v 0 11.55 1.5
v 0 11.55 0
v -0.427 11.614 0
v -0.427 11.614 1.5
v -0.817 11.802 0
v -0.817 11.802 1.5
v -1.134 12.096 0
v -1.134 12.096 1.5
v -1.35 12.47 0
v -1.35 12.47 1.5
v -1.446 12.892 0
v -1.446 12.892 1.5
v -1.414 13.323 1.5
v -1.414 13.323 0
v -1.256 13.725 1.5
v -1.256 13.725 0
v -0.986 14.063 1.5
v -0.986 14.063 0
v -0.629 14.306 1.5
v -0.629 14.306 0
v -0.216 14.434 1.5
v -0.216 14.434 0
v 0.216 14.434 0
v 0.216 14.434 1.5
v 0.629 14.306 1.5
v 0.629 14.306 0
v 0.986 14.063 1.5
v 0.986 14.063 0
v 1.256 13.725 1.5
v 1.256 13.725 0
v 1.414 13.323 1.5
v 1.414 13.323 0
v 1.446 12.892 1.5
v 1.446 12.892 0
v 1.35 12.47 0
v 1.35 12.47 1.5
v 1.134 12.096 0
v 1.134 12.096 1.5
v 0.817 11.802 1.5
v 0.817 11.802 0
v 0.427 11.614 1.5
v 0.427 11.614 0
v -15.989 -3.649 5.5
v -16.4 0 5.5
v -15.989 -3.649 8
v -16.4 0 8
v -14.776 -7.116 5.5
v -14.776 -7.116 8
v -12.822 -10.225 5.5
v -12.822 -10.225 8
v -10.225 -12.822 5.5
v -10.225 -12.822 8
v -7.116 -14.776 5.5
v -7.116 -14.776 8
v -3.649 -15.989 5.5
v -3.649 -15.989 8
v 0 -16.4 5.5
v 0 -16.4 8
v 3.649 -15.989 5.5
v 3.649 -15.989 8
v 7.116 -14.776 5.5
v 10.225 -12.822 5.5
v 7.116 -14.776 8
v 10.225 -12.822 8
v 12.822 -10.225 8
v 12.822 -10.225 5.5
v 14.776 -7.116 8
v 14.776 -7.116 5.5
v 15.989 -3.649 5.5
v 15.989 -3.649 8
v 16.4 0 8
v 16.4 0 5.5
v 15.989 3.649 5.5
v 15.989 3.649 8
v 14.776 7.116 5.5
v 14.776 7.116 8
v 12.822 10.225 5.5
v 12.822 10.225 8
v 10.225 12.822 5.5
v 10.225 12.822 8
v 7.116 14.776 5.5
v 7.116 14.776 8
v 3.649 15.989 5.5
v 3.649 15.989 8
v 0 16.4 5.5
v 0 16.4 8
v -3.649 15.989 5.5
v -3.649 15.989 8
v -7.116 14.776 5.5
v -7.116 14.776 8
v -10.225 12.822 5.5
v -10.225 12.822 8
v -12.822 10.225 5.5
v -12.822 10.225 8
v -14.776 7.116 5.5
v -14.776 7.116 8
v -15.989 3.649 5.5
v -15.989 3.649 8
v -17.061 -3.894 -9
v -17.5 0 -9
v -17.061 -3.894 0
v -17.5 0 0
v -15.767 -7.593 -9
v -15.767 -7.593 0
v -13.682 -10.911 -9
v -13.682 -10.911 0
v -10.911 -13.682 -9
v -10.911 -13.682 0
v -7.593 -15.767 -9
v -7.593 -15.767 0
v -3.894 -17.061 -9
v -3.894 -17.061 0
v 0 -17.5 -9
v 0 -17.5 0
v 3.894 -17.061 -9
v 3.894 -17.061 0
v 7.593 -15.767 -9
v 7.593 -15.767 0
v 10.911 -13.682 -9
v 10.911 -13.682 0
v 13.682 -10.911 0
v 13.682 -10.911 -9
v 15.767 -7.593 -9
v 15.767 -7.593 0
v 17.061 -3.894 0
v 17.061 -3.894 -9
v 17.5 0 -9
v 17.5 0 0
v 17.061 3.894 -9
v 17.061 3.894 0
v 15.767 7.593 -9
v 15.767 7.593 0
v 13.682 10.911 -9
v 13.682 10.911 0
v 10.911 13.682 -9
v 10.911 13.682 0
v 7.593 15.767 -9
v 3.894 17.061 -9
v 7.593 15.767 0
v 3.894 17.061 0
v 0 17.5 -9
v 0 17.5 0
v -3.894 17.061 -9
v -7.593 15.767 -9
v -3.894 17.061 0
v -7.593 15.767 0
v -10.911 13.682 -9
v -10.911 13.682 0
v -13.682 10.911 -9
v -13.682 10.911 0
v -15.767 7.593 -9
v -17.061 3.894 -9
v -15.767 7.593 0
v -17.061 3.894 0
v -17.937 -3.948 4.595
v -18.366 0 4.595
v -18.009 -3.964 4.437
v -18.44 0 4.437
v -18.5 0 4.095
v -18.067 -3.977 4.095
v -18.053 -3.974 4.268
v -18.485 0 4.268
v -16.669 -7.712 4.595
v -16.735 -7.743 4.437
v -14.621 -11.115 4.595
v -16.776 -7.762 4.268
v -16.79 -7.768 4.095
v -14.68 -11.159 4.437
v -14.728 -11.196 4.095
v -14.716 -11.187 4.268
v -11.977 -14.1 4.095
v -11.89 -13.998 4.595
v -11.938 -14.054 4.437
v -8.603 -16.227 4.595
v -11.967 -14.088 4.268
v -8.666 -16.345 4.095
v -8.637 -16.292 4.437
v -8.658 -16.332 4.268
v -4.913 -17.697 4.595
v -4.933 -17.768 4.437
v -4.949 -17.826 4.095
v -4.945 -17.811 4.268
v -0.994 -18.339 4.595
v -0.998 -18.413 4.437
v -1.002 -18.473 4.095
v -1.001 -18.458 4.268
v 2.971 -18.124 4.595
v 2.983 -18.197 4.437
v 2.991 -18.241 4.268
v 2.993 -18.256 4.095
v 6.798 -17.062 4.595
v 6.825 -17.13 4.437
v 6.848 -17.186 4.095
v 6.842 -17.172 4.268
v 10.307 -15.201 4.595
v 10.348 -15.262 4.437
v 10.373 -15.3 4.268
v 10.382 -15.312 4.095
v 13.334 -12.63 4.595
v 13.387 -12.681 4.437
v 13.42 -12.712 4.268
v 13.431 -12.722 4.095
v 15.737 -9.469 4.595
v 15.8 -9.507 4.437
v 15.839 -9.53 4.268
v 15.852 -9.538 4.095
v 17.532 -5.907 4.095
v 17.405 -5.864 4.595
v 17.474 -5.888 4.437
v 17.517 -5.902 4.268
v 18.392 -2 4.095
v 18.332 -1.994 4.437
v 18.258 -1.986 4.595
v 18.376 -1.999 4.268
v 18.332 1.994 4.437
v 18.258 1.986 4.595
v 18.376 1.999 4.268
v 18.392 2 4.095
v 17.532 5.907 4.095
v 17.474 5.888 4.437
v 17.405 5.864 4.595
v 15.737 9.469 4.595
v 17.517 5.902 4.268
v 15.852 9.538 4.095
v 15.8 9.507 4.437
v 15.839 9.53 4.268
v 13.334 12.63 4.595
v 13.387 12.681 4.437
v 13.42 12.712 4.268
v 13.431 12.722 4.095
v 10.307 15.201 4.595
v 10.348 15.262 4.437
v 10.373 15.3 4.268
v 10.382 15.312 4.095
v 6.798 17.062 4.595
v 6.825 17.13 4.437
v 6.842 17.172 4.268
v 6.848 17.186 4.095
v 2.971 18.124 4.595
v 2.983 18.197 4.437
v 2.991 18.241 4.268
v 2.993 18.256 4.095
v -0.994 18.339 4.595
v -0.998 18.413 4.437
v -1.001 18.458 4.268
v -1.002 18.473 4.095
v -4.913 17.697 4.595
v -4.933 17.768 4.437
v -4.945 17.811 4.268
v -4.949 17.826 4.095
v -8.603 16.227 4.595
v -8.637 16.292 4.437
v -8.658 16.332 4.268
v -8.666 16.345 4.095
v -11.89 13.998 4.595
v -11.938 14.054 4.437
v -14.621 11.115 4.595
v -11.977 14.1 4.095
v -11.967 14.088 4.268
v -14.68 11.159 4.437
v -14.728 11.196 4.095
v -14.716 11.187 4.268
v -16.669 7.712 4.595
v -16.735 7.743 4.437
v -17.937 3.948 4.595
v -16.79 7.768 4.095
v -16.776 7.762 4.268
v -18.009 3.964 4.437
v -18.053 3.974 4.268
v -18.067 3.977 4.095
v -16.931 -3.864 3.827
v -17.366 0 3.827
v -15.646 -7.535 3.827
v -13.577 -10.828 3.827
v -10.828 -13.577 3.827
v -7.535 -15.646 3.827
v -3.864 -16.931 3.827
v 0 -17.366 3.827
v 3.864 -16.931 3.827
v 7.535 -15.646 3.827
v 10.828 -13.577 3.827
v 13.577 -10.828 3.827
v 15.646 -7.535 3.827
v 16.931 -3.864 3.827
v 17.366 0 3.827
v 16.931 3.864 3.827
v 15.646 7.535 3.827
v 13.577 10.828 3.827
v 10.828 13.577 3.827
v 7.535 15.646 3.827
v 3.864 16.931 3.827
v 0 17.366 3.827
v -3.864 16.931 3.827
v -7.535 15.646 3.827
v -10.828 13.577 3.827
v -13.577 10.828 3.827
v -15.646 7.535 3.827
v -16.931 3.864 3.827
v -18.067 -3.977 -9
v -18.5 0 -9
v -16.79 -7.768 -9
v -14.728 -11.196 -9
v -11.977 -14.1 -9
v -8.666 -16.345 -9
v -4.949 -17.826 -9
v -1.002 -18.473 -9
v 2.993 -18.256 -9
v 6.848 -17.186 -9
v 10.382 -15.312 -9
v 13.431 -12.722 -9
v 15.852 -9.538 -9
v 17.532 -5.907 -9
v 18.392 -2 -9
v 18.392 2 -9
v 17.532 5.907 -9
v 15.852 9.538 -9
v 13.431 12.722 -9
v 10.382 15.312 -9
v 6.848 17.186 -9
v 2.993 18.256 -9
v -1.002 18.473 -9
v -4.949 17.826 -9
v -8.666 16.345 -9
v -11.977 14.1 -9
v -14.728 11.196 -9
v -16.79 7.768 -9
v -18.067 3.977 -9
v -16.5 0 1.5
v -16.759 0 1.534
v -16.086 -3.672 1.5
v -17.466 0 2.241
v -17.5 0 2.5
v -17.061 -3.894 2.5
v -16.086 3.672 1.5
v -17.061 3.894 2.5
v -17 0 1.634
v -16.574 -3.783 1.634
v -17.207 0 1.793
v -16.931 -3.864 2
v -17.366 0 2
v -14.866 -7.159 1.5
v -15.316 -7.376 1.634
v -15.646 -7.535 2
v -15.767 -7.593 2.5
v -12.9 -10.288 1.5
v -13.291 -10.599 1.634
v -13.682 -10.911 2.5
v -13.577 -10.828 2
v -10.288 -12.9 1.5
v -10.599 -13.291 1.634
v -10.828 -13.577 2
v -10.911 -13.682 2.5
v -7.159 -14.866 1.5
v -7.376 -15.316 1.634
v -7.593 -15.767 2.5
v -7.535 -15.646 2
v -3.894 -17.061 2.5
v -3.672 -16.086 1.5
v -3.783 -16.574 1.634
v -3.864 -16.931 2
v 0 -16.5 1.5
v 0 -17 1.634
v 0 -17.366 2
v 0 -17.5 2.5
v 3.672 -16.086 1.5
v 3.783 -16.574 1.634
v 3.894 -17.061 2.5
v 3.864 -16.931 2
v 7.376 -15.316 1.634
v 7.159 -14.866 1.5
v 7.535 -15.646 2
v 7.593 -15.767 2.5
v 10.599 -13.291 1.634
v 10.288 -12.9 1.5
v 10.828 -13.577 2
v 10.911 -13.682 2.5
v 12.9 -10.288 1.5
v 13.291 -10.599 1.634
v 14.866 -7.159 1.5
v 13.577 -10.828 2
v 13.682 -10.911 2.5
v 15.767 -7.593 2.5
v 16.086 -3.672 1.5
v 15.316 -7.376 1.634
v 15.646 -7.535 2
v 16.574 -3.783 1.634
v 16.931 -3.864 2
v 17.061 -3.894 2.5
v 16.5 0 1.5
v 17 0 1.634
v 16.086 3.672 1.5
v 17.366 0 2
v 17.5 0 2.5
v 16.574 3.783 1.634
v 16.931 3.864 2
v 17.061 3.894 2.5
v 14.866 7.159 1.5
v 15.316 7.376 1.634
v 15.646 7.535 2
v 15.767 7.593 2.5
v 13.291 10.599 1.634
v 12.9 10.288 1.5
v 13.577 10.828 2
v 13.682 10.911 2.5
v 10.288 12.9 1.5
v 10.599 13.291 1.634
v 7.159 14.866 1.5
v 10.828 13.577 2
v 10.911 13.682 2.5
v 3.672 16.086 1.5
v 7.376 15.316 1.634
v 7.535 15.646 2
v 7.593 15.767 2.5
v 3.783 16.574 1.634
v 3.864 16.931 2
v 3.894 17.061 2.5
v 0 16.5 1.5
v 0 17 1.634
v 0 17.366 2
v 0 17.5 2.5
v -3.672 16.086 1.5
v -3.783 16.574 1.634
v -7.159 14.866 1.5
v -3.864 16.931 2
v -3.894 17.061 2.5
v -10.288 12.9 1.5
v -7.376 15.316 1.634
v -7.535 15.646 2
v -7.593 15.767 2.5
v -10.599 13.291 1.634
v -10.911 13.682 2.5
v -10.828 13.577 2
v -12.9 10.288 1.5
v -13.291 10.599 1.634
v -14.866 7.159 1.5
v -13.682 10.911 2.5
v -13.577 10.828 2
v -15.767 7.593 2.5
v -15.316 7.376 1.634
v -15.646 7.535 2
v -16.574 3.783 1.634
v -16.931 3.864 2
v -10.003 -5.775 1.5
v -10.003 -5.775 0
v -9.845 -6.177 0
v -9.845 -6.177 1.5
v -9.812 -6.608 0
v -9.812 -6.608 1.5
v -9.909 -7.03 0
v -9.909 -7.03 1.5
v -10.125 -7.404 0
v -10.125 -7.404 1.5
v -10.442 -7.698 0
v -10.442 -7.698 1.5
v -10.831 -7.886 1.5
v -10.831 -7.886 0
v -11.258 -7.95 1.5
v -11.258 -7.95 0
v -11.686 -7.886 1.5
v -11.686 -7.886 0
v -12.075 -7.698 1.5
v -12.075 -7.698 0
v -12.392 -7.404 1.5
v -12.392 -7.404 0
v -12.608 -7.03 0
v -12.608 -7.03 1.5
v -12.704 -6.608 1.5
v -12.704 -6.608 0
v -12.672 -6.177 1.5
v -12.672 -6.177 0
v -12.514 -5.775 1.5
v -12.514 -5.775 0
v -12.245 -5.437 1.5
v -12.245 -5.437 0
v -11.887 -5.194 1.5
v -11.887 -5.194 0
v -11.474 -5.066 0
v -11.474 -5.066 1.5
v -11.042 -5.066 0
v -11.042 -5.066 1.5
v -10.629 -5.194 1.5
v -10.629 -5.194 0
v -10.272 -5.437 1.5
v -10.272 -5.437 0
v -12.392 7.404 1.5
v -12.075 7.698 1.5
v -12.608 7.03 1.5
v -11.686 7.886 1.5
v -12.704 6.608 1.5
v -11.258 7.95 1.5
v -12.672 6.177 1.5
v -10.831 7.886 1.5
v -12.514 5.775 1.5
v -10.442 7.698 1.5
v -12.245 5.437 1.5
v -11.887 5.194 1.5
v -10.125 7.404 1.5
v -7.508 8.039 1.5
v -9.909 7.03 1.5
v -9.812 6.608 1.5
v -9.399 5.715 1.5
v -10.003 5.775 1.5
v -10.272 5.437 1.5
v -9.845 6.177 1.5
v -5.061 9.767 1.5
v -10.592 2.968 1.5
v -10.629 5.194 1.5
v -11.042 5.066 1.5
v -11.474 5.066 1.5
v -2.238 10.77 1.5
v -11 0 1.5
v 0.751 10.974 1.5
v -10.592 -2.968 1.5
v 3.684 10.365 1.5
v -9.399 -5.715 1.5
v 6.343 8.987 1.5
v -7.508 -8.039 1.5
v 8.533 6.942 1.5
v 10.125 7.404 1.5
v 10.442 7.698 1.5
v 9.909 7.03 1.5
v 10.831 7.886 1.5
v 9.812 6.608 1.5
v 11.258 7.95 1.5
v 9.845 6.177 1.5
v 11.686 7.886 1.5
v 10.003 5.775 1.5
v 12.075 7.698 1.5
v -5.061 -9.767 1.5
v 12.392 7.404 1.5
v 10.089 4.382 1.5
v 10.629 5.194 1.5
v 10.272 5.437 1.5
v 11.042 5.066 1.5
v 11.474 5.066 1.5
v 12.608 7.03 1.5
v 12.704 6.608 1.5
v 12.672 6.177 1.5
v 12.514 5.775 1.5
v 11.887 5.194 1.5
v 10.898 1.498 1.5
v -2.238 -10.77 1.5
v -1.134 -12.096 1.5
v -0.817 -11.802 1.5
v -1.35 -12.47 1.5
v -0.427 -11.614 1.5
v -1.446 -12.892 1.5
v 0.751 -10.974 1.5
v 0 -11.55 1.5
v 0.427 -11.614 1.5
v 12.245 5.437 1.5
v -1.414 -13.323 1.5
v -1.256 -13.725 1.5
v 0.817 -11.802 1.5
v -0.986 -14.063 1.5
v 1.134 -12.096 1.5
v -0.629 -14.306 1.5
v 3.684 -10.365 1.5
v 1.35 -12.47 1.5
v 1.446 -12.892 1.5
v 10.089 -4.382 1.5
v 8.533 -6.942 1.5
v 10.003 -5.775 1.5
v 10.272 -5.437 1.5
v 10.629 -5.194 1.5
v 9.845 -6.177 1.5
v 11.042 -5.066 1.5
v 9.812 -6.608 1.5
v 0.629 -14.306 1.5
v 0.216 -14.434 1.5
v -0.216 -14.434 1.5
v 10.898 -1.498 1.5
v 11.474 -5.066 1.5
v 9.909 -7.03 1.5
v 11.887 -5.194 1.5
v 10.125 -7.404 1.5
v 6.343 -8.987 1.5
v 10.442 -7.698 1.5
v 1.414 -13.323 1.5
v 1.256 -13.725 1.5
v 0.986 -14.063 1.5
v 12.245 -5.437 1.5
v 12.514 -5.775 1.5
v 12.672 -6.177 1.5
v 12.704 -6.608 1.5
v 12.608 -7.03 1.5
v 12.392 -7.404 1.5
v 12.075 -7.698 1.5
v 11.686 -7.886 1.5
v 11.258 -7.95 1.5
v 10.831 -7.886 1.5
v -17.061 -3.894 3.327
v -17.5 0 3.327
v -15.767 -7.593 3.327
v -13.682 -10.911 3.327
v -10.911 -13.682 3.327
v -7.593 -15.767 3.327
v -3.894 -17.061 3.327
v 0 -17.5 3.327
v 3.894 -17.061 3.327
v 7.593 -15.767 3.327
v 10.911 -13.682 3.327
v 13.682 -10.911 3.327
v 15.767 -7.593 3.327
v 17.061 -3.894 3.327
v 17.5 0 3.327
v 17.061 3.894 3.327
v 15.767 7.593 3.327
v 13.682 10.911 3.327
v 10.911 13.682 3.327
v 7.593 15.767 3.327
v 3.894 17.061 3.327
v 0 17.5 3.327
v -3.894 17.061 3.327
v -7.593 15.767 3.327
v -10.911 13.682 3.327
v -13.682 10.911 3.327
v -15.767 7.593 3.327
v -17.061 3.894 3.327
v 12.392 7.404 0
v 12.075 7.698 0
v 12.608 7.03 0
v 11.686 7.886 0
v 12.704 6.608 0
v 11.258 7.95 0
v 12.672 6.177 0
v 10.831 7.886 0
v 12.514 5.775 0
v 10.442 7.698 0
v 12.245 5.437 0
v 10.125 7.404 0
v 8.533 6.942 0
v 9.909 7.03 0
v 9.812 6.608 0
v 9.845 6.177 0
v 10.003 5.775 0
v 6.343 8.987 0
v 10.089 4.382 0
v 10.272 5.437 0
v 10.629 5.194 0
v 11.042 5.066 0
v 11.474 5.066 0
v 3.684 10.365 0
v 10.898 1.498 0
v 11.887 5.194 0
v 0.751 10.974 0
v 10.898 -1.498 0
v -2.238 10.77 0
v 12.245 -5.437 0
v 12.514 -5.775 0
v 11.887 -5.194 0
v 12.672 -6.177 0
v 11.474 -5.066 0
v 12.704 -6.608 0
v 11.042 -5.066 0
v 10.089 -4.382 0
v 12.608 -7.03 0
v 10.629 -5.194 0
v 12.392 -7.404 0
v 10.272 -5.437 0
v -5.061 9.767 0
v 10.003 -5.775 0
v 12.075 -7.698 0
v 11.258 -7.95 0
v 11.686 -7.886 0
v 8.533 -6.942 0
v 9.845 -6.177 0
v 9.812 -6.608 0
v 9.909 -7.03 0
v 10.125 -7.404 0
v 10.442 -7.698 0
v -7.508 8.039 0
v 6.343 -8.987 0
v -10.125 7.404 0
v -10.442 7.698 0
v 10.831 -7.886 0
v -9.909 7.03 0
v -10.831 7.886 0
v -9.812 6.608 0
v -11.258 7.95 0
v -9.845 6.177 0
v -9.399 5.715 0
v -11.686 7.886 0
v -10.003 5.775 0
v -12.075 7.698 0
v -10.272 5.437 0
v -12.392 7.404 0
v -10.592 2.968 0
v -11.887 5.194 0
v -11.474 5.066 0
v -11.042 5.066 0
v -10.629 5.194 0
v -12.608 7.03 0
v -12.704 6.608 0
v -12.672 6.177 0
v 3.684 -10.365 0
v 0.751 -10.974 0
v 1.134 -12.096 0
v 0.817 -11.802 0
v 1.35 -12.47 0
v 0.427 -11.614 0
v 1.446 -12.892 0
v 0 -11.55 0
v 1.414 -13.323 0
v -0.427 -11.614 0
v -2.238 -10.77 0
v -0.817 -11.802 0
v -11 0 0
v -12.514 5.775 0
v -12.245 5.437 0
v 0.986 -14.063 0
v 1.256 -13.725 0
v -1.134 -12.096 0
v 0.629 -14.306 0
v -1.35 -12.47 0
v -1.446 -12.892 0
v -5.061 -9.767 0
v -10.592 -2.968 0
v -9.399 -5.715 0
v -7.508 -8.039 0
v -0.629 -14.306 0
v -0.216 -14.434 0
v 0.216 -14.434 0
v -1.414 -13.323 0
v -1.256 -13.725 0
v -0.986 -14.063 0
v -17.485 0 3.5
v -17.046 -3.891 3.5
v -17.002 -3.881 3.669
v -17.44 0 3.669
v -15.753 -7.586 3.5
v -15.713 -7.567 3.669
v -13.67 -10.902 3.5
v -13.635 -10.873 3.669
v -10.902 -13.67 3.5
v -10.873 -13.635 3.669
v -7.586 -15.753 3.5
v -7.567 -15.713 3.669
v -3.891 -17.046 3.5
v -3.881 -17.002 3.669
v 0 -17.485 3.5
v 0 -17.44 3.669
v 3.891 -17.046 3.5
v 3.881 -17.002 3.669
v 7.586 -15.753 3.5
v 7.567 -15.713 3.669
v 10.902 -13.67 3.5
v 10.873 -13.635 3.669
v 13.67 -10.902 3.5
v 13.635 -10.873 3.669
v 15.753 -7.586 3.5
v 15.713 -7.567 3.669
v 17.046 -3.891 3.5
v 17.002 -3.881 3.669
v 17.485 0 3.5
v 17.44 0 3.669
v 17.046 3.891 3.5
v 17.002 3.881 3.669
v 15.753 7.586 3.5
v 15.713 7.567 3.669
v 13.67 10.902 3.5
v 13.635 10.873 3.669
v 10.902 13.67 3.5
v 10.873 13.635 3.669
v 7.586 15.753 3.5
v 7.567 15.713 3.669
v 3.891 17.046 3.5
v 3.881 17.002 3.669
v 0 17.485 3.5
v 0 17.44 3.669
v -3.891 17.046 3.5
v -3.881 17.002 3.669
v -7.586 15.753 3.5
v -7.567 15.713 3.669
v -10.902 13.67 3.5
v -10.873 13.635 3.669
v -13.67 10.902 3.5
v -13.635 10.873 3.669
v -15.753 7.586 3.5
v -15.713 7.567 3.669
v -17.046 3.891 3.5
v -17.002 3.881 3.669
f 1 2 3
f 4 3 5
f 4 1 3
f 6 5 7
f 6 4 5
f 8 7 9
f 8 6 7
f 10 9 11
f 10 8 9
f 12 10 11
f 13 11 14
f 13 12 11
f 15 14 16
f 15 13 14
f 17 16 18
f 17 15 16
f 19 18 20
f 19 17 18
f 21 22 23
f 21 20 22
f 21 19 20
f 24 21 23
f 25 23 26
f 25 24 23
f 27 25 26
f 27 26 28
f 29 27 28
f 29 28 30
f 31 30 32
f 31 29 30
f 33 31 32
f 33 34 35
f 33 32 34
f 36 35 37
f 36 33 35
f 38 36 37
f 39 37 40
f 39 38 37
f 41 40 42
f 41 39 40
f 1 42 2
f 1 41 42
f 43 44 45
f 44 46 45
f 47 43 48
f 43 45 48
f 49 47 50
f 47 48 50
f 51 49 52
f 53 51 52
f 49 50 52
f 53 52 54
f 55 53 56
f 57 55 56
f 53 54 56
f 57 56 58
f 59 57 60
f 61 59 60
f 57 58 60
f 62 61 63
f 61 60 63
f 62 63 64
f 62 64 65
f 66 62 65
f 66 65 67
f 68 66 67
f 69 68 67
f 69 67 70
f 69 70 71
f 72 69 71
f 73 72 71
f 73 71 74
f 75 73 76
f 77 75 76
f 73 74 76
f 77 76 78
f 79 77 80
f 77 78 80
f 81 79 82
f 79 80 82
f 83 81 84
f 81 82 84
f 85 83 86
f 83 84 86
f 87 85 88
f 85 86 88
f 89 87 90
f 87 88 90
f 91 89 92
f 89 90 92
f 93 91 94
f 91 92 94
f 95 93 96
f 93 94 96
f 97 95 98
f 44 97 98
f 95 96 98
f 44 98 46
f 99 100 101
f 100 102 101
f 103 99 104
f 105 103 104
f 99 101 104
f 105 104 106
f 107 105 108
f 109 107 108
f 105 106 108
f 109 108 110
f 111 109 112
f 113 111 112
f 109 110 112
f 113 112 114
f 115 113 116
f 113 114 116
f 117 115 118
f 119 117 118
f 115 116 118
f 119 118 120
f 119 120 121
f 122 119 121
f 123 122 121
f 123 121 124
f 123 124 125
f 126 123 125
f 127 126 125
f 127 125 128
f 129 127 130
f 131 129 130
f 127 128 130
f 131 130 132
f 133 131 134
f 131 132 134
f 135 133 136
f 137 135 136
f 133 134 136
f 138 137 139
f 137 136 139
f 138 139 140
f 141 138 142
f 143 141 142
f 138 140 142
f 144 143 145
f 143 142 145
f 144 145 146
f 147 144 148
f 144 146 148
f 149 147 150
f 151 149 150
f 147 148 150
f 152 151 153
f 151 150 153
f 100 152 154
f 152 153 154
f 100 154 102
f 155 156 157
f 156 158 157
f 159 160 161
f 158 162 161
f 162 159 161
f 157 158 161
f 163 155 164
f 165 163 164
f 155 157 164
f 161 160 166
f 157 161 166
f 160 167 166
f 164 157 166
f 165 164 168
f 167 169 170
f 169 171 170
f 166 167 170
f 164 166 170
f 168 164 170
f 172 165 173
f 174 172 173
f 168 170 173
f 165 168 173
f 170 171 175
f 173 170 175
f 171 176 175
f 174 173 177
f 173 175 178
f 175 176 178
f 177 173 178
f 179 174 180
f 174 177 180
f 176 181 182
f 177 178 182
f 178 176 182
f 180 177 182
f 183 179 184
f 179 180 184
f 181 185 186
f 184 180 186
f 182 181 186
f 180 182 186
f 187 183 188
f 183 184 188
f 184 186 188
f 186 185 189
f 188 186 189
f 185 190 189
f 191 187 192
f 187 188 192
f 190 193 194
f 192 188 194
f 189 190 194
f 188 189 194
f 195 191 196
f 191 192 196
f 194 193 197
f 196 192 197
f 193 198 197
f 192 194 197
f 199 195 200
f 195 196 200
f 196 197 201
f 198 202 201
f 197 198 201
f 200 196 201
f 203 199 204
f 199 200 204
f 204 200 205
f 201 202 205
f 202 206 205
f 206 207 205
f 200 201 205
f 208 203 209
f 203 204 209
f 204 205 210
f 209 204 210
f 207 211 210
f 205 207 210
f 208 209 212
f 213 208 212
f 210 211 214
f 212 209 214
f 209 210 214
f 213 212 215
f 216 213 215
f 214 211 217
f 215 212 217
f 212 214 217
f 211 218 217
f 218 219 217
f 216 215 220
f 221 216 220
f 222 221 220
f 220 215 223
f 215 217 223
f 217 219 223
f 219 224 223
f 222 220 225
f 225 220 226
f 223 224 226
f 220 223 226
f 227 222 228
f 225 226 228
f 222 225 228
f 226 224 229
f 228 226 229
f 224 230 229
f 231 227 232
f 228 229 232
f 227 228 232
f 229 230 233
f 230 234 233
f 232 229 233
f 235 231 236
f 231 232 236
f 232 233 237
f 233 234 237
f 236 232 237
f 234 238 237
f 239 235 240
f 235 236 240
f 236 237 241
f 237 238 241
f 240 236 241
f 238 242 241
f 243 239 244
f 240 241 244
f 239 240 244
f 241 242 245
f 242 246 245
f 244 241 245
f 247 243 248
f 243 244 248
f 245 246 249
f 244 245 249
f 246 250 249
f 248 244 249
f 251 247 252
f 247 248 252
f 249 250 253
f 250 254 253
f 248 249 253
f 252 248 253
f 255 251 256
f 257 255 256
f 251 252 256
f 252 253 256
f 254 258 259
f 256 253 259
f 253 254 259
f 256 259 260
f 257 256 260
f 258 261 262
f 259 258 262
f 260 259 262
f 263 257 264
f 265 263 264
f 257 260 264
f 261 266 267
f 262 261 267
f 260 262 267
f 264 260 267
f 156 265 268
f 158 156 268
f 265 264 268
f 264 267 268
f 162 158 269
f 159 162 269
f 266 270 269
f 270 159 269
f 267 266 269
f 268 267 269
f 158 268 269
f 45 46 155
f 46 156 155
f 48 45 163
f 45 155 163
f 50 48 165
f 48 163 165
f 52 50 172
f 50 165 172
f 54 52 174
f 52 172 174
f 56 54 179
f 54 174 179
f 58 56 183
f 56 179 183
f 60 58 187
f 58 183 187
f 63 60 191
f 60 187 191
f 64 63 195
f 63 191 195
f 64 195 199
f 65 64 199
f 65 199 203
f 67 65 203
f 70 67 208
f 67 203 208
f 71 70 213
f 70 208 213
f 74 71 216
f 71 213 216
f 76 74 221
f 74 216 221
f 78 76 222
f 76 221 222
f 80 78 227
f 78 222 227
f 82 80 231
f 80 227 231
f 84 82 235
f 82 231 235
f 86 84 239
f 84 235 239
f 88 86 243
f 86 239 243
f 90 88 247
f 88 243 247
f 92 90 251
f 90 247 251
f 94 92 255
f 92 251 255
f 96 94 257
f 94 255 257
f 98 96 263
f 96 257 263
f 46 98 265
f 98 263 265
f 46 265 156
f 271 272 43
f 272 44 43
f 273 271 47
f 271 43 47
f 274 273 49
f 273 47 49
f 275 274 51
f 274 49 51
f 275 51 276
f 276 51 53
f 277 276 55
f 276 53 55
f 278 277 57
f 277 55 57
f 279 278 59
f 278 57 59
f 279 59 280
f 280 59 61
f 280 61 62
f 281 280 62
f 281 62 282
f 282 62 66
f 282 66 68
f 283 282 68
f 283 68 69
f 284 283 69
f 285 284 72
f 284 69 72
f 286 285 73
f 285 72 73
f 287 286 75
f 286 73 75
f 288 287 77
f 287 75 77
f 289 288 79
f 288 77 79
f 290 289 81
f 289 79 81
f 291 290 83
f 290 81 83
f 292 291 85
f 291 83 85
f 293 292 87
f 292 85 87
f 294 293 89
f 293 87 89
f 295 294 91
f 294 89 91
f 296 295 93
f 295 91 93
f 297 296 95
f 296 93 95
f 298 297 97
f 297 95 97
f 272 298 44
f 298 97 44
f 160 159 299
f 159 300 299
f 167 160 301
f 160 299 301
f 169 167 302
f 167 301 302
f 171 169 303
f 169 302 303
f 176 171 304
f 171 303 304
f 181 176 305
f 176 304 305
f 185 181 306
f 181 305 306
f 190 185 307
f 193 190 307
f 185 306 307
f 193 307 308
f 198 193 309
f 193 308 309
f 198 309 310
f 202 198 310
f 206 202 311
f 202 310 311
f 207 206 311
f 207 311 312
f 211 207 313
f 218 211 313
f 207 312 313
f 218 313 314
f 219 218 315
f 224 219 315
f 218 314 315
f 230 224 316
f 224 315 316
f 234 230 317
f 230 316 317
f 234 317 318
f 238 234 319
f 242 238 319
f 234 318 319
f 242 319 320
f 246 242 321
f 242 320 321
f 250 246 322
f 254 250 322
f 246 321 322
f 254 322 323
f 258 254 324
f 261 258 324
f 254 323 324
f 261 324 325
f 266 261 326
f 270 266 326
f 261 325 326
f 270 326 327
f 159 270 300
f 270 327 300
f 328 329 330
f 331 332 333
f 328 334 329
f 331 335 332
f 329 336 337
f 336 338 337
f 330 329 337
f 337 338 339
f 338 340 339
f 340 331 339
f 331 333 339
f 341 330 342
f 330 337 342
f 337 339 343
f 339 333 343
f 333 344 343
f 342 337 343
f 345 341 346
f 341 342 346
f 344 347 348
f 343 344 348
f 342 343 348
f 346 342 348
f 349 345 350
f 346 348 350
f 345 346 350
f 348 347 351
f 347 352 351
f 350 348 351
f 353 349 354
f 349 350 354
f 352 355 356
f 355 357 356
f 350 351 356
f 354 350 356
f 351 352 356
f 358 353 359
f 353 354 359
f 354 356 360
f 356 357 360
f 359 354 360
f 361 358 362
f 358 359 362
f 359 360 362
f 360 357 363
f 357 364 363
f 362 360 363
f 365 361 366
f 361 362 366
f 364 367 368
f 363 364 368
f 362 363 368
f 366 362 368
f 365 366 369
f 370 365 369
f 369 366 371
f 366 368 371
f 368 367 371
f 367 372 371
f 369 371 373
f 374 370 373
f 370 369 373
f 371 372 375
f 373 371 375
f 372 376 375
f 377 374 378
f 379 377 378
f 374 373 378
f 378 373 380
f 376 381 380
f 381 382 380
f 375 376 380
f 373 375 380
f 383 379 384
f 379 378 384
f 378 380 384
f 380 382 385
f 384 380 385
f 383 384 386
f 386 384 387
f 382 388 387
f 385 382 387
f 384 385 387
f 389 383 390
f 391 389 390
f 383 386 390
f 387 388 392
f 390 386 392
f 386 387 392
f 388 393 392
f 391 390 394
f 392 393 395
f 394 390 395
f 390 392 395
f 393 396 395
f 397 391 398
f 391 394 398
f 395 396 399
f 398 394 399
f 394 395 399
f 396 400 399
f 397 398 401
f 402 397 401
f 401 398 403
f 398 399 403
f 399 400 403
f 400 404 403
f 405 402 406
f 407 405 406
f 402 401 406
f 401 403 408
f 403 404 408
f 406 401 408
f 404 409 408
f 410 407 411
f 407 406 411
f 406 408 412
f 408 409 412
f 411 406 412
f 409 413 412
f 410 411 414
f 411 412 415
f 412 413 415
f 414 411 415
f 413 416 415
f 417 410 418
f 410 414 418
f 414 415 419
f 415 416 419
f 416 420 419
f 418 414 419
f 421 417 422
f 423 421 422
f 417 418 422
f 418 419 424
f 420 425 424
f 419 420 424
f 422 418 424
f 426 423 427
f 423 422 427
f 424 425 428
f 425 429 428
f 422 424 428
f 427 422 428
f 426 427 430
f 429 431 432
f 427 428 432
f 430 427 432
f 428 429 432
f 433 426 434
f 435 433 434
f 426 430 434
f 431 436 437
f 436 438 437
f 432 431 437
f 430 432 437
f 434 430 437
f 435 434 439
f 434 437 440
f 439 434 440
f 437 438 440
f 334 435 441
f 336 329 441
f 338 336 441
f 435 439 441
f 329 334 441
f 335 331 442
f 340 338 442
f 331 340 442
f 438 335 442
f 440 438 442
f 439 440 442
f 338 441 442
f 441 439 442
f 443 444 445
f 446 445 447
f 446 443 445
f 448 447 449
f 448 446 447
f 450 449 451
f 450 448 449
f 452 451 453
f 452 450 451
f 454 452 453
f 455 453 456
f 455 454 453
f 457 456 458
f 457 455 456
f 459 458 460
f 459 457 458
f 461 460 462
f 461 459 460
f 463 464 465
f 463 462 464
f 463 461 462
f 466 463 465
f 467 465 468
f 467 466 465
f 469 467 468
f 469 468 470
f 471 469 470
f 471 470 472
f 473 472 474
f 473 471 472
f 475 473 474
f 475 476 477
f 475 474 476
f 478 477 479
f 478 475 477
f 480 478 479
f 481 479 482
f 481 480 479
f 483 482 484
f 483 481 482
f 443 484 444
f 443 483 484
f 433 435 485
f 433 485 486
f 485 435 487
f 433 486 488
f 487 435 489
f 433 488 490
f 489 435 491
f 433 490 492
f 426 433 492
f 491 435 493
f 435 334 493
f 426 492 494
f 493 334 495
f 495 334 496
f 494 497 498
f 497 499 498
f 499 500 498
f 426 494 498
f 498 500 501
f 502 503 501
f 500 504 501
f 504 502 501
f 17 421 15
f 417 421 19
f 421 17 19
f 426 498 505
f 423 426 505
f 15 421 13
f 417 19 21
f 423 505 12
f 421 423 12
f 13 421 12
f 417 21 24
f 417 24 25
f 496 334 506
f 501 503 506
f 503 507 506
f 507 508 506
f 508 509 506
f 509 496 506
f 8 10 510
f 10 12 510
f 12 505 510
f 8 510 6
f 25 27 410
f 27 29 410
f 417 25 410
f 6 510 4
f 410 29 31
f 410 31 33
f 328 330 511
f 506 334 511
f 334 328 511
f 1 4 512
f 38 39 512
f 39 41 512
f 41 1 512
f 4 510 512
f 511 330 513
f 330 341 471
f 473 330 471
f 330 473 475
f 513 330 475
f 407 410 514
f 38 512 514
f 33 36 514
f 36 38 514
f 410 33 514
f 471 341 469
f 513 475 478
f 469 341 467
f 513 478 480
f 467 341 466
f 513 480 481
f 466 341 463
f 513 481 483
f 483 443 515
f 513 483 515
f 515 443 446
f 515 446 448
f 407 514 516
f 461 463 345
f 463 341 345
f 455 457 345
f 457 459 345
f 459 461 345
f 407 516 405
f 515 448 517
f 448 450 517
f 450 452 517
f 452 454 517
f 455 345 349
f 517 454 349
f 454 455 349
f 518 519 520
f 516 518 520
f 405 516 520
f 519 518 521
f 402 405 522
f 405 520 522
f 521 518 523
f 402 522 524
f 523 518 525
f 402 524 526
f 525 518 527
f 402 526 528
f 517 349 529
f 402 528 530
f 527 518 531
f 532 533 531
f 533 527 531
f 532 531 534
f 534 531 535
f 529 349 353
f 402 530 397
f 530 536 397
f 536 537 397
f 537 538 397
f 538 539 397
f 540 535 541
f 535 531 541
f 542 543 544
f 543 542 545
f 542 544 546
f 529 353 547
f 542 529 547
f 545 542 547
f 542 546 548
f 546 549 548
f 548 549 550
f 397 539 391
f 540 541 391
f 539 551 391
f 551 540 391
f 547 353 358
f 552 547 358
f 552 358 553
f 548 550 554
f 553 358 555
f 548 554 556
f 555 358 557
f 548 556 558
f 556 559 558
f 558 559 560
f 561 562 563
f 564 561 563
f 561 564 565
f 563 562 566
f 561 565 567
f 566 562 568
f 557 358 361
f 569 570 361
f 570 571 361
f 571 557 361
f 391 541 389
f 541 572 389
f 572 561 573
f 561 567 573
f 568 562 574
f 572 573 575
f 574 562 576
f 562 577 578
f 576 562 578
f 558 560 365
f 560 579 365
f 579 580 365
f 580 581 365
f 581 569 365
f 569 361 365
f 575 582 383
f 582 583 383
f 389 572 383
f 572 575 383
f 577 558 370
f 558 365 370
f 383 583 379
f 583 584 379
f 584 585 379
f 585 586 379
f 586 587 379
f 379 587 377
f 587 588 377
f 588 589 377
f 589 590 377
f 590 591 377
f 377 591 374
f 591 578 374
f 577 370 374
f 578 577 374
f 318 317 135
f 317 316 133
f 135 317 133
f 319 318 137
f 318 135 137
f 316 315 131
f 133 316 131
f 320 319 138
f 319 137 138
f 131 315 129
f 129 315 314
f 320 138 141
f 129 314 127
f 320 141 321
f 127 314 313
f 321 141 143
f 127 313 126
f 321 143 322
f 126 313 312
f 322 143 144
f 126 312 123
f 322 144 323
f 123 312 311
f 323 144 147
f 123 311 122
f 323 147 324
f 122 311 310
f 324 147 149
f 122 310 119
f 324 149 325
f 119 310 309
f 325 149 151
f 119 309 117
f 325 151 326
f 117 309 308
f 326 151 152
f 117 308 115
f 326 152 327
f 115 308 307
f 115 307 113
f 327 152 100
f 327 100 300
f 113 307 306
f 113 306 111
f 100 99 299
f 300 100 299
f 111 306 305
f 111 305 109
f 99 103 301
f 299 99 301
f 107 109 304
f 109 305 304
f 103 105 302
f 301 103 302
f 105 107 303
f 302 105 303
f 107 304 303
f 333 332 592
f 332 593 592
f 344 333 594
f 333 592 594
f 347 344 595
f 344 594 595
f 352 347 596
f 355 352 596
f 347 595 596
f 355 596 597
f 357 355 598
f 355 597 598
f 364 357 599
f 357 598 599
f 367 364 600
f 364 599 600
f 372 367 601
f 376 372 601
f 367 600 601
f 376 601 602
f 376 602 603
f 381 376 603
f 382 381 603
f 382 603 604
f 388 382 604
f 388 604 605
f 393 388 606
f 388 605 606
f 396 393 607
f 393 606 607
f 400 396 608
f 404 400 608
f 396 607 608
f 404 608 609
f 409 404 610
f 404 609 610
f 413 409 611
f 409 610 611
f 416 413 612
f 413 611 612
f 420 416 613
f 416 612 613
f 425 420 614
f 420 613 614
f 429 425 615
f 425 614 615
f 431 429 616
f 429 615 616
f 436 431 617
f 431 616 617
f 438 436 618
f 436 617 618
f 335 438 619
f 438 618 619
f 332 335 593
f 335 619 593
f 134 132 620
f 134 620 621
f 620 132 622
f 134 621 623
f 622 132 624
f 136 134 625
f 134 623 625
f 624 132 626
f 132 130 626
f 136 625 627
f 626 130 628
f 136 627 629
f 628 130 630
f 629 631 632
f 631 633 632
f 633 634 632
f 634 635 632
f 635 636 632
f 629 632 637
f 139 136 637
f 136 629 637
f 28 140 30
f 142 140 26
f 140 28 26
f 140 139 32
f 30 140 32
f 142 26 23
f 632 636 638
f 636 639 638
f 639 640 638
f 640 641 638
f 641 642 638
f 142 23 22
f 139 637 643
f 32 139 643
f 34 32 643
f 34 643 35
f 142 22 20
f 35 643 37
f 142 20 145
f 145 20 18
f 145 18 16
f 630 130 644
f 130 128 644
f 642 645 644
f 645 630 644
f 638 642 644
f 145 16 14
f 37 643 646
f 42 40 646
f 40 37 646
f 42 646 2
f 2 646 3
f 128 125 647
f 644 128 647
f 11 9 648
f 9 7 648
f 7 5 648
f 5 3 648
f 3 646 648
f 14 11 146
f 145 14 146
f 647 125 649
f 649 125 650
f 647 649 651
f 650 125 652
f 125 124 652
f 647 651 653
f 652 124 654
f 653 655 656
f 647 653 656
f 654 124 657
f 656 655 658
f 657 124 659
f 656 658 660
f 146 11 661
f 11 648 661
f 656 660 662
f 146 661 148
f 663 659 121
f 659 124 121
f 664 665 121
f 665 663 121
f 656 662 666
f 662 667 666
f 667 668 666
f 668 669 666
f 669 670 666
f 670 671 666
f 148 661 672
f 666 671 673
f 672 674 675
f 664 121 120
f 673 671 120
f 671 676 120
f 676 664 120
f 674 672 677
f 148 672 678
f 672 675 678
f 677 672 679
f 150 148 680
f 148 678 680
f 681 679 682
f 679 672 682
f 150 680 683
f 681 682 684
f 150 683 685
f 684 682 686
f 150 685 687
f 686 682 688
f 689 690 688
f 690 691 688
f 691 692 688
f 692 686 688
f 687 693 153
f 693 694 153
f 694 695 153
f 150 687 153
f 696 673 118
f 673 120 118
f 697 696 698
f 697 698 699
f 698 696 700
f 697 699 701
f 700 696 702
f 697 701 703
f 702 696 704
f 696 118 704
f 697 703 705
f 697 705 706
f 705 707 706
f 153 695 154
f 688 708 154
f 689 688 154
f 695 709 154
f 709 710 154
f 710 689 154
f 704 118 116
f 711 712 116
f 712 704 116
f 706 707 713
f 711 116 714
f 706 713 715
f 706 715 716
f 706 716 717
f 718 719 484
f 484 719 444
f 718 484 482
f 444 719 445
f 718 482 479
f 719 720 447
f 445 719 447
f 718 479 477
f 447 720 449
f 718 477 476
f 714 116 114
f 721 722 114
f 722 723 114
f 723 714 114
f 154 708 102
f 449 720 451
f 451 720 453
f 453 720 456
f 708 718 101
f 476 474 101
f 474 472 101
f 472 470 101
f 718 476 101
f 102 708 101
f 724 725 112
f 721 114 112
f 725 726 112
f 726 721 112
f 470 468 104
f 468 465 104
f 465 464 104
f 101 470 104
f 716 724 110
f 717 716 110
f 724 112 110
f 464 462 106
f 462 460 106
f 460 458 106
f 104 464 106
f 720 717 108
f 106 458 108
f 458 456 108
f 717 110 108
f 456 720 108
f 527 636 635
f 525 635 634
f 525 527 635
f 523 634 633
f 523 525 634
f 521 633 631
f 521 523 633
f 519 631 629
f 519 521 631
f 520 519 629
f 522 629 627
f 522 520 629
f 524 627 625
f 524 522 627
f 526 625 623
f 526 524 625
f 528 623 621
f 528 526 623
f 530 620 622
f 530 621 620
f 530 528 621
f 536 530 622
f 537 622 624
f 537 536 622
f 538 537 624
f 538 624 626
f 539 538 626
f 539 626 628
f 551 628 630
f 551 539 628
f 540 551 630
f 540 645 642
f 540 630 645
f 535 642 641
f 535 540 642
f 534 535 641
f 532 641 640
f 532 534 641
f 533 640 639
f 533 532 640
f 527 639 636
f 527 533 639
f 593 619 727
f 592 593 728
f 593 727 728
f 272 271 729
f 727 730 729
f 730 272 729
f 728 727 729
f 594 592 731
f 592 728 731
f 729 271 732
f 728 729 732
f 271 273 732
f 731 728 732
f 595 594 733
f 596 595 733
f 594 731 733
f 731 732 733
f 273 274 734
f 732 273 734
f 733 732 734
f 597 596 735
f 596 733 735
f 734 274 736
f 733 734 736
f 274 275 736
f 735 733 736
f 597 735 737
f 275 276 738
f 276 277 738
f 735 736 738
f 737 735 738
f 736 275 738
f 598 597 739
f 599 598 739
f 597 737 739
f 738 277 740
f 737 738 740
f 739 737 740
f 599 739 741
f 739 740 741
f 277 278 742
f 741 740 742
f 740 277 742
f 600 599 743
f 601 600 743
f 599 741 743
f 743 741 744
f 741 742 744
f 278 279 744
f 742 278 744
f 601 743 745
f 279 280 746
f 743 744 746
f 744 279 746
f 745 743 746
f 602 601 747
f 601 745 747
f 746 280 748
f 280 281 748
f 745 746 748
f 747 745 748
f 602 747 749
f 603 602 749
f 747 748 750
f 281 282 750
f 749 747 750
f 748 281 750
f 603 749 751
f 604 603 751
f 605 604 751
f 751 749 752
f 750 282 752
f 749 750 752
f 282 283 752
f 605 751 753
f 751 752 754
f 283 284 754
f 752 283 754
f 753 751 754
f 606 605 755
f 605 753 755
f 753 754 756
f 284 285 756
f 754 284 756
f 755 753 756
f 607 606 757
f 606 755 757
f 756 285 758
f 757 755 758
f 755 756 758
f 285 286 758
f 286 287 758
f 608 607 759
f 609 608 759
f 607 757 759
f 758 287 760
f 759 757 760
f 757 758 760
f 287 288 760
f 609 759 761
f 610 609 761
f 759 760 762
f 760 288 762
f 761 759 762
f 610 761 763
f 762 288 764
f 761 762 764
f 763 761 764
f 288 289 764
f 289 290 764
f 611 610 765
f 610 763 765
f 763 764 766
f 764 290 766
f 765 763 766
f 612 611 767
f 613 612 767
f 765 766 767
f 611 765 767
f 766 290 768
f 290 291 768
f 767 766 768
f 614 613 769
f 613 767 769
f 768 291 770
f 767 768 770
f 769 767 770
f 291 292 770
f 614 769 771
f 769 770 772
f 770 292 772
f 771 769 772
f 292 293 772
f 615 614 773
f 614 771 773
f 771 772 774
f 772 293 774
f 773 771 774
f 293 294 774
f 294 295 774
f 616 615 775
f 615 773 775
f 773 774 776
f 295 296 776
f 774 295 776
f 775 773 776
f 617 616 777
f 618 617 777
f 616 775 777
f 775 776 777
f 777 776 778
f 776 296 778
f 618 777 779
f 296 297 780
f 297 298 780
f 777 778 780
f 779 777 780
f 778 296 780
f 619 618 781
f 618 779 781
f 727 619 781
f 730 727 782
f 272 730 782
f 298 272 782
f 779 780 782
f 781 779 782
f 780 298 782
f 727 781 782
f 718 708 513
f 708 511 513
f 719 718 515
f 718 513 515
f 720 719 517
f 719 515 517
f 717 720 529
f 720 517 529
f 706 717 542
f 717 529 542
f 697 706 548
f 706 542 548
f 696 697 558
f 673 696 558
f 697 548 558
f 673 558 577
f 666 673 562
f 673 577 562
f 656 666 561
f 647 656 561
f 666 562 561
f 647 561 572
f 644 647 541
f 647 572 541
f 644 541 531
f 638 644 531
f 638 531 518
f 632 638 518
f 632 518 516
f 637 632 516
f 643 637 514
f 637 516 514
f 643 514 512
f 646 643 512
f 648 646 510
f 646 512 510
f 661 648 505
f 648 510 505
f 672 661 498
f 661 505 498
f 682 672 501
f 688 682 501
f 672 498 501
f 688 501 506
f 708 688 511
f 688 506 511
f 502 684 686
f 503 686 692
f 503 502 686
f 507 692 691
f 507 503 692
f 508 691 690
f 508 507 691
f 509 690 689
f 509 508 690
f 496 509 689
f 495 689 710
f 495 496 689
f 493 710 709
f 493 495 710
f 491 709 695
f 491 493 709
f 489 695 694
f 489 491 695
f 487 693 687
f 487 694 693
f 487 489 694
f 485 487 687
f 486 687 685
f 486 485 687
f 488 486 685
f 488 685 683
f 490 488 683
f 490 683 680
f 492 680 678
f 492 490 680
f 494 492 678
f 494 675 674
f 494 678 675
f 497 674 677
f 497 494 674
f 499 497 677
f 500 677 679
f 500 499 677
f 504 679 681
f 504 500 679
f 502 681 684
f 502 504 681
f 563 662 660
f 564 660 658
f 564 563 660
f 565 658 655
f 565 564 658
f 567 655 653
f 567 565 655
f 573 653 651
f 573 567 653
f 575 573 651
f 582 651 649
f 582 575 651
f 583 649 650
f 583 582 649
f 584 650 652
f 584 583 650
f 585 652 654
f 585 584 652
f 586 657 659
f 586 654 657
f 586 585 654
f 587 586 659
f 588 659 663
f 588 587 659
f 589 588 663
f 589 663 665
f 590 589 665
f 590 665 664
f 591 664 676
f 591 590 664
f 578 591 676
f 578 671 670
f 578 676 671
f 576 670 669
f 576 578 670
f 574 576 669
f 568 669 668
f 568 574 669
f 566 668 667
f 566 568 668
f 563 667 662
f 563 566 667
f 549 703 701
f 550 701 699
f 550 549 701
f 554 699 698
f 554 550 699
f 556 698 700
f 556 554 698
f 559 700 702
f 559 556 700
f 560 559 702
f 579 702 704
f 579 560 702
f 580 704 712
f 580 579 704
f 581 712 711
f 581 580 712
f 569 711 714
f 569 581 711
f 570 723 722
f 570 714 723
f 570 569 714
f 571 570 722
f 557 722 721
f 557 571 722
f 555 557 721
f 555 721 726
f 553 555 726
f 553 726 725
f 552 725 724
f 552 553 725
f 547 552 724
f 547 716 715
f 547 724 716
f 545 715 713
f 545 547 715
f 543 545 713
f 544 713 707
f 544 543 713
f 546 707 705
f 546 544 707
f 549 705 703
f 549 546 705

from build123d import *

# Parameters (mm, degrees)
CIRPATTERN1_COUNT = 6


with BuildPart() as part:
    # Sketch1 → Revolve1 (revolve)
    with BuildSketch(Plane(origin=(0, 0, 0), x_dir=(0, 0, -1), z_dir=(1, 0, 0))):
        with BuildLine():
            Line((-8, 16.4), (-4.594744112, 18.366025404))
            ThreePointArc((-4.594744112, 18.366025404), (-4.353563157, 18.465925826), (-4.094744112, 18.5))
            Line((-4.094744112, 18.5), (9, 18.5))
            Line((9, 18.5), (9, 17.5))
            Line((9, 17.5), (0, 17.5))
            Line((0, 17.5), (0, 11))
            Line((0, 11), (-1.5, 11))
            Line((-1.5, 11), (-1.5, 16.5))
            ThreePointArc((-1.5, 16.5), (-1.792893219, 17.207106781), (-2.5, 17.5))
            Line((-2.5, 17.5), (-3.326794919, 17.5))
            ThreePointArc((-3.326794919, 17.5), (-3.585613964, 17.465925826), (-3.826794919, 17.366025404))
            Line((-3.826794919, 17.366025404), (-5.5, 16.4))
            Line((-5.5, 16.4), (-8, 16.4))
        make_face()
    revolve(axis=Axis((0, 0, 0), (0, 0, 1)))

    # Sketch2 → M2.5 Clearance Hole1 (revolve, cut)
    with BuildSketch(Plane(origin=(0, 13, 1.5), x_dir=(0, -1, 0), z_dir=(1, 0, 0))):
        Polygon((0, 0), (0, 23.871247898), (1.45, 23), (1.45, 0), align=None)
    m2_5_clearance_hole1 = revolve(axis=Axis((0, 13, 7.85), (0, 0, -1)), mode=Mode.SUBTRACT)

    # CirPattern1: M2.5 Clearance Hole1 ×6 about axis
    cirpattern1_axis = Axis((0, 0, 4.094744112), (0, 0, -1))
    for i in range(1, CIRPATTERN1_COUNT):
        add(m2_5_clearance_hole1.rotate(cirpattern1_axis, i * 360 / CIRPATTERN1_COUNT), mode=Mode.SUBTRACT)


solid = part.part
